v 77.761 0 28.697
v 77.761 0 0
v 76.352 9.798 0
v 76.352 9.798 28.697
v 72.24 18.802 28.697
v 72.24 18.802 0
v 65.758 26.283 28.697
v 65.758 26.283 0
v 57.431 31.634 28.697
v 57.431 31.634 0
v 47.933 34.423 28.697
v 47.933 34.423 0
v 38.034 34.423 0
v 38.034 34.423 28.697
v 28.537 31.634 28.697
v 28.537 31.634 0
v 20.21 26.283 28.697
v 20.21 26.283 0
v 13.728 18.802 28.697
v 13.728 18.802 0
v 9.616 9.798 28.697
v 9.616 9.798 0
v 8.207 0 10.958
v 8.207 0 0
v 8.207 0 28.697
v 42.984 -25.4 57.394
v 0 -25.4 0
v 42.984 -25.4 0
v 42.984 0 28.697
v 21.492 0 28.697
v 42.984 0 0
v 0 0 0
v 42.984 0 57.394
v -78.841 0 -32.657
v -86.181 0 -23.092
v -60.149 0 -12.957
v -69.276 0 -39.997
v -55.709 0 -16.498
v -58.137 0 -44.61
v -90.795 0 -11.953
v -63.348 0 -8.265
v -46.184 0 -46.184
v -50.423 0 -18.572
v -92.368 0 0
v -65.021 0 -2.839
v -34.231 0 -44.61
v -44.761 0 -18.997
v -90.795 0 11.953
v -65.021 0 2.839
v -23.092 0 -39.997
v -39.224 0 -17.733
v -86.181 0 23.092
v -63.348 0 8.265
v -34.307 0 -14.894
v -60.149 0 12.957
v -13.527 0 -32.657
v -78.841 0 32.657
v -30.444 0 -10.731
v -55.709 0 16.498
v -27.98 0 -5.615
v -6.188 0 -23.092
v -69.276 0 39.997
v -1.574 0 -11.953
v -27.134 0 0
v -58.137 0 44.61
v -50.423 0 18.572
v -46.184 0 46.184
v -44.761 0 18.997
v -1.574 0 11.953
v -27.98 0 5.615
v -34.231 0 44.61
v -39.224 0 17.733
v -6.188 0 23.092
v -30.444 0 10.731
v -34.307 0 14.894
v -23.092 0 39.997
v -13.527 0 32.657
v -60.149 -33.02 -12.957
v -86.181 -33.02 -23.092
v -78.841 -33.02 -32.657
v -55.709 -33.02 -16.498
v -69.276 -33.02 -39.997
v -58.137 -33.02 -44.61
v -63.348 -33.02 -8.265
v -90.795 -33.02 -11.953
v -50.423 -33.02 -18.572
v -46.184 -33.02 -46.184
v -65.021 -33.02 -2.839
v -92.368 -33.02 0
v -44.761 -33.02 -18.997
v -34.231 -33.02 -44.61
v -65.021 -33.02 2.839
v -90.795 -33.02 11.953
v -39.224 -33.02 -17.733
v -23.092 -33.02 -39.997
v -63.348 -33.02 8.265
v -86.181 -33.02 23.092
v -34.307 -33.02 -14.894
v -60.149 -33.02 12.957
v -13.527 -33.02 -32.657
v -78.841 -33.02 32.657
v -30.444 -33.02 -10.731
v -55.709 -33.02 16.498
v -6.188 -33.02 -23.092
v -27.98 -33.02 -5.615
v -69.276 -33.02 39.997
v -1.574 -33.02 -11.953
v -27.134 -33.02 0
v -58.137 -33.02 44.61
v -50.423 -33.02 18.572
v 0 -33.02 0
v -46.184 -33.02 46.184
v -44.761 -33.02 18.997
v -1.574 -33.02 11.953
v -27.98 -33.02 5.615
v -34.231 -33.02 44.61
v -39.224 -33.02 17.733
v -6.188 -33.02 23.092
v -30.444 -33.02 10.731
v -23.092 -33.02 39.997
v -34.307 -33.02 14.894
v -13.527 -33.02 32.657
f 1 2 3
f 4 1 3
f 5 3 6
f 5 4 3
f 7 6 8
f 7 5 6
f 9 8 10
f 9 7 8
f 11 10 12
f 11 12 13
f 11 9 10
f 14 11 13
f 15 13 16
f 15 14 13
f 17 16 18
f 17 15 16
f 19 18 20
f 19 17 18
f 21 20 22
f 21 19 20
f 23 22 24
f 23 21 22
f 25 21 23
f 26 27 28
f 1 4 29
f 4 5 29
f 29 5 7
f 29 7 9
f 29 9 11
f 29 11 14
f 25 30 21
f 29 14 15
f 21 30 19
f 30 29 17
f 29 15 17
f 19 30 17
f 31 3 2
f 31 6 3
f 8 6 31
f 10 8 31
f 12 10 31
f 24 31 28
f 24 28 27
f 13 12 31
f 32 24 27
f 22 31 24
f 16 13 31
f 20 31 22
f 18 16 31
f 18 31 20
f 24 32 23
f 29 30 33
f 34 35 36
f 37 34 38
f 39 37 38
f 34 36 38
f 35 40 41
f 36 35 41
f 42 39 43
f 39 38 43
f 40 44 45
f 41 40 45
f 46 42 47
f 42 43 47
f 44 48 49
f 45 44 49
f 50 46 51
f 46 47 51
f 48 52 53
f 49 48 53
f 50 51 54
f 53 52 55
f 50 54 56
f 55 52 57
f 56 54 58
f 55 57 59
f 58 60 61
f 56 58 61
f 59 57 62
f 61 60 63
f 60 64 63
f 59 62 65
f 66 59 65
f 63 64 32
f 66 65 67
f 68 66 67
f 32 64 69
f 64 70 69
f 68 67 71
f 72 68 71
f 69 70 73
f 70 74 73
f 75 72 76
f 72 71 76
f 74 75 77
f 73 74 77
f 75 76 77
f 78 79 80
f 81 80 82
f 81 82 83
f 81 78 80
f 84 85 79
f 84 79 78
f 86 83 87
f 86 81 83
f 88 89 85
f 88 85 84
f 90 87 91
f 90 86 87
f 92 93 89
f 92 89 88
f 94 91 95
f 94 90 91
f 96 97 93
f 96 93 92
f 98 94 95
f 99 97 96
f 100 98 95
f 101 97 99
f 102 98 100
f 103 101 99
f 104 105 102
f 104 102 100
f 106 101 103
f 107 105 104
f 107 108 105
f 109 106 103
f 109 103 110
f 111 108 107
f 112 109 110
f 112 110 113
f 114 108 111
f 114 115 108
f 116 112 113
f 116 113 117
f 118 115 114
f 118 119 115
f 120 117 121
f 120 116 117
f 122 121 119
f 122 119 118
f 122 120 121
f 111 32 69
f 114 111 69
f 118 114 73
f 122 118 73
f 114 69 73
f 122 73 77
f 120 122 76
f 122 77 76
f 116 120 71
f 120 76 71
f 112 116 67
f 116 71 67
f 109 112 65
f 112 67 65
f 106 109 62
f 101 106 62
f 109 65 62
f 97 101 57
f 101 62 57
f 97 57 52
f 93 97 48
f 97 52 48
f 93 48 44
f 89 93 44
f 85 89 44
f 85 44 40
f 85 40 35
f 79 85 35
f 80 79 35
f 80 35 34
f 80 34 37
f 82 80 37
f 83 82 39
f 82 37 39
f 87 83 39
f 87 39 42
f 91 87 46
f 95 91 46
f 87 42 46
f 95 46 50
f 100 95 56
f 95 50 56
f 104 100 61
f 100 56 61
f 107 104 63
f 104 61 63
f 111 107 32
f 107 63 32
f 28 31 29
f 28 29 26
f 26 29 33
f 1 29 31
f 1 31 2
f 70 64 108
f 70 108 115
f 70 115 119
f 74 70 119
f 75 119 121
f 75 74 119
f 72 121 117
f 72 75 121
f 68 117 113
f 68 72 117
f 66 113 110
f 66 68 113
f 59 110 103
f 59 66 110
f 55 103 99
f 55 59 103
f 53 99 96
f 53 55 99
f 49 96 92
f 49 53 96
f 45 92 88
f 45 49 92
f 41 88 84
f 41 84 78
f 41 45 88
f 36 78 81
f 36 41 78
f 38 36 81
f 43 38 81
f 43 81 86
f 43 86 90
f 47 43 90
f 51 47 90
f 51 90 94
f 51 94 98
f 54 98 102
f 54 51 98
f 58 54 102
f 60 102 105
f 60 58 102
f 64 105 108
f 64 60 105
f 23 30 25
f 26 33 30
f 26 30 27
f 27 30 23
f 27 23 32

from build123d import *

# Parameters (mm, degrees)
F0_R     = 46.1841337383
F1_DEPTH = 33.02
F2_DEPTH = 25.4
F6_W     = 34.7768329084
F6_H     = 28.6970213056
F3_ANGLE = 180
F4_R     = 19.05
F5_DEPTH = 33.02


with BuildPart() as f1:
    # F0 (on Front) → F1 (new body)
    with BuildSketch(Plane.XZ):
        with Locations((-46.1841337383, 0)):
            Circle(F0_R)
    extrude(amount=F1_DEPTH)

    # F4 (on face) → F5 (cut, through all)
    with BuildSketch(Plane.XZ):
        with Locations((-46.1841337383, 0)):
            Circle(F4_R)
    extrude(amount=F5_DEPTH, mode=Mode.SUBTRACT)


with BuildPart() as f2:
    # F6 (on Front) → F2 (new body)
    with BuildSketch(Plane.XZ):
        Polygon((42.9837293923, 28.6970213056), (42.9837293923, 57.3940426111), (0, 0), (42.9837293923, 0), align=None)
    extrude(amount=F2_DEPTH)

    # F6 (on Front) → F3 (revolve)
    with BuildSketch(Plane.XZ):
        with Locations((60.3721458465, 14.3485106528)):
            Rectangle(F6_W, F6_H)
    revolve(axis=Axis((42.9837293923, 0, 28.6970213056), (0, 0, 1)), revolution_arc=F3_ANGLE)


solid = Compound([f1.part, f2.part])
